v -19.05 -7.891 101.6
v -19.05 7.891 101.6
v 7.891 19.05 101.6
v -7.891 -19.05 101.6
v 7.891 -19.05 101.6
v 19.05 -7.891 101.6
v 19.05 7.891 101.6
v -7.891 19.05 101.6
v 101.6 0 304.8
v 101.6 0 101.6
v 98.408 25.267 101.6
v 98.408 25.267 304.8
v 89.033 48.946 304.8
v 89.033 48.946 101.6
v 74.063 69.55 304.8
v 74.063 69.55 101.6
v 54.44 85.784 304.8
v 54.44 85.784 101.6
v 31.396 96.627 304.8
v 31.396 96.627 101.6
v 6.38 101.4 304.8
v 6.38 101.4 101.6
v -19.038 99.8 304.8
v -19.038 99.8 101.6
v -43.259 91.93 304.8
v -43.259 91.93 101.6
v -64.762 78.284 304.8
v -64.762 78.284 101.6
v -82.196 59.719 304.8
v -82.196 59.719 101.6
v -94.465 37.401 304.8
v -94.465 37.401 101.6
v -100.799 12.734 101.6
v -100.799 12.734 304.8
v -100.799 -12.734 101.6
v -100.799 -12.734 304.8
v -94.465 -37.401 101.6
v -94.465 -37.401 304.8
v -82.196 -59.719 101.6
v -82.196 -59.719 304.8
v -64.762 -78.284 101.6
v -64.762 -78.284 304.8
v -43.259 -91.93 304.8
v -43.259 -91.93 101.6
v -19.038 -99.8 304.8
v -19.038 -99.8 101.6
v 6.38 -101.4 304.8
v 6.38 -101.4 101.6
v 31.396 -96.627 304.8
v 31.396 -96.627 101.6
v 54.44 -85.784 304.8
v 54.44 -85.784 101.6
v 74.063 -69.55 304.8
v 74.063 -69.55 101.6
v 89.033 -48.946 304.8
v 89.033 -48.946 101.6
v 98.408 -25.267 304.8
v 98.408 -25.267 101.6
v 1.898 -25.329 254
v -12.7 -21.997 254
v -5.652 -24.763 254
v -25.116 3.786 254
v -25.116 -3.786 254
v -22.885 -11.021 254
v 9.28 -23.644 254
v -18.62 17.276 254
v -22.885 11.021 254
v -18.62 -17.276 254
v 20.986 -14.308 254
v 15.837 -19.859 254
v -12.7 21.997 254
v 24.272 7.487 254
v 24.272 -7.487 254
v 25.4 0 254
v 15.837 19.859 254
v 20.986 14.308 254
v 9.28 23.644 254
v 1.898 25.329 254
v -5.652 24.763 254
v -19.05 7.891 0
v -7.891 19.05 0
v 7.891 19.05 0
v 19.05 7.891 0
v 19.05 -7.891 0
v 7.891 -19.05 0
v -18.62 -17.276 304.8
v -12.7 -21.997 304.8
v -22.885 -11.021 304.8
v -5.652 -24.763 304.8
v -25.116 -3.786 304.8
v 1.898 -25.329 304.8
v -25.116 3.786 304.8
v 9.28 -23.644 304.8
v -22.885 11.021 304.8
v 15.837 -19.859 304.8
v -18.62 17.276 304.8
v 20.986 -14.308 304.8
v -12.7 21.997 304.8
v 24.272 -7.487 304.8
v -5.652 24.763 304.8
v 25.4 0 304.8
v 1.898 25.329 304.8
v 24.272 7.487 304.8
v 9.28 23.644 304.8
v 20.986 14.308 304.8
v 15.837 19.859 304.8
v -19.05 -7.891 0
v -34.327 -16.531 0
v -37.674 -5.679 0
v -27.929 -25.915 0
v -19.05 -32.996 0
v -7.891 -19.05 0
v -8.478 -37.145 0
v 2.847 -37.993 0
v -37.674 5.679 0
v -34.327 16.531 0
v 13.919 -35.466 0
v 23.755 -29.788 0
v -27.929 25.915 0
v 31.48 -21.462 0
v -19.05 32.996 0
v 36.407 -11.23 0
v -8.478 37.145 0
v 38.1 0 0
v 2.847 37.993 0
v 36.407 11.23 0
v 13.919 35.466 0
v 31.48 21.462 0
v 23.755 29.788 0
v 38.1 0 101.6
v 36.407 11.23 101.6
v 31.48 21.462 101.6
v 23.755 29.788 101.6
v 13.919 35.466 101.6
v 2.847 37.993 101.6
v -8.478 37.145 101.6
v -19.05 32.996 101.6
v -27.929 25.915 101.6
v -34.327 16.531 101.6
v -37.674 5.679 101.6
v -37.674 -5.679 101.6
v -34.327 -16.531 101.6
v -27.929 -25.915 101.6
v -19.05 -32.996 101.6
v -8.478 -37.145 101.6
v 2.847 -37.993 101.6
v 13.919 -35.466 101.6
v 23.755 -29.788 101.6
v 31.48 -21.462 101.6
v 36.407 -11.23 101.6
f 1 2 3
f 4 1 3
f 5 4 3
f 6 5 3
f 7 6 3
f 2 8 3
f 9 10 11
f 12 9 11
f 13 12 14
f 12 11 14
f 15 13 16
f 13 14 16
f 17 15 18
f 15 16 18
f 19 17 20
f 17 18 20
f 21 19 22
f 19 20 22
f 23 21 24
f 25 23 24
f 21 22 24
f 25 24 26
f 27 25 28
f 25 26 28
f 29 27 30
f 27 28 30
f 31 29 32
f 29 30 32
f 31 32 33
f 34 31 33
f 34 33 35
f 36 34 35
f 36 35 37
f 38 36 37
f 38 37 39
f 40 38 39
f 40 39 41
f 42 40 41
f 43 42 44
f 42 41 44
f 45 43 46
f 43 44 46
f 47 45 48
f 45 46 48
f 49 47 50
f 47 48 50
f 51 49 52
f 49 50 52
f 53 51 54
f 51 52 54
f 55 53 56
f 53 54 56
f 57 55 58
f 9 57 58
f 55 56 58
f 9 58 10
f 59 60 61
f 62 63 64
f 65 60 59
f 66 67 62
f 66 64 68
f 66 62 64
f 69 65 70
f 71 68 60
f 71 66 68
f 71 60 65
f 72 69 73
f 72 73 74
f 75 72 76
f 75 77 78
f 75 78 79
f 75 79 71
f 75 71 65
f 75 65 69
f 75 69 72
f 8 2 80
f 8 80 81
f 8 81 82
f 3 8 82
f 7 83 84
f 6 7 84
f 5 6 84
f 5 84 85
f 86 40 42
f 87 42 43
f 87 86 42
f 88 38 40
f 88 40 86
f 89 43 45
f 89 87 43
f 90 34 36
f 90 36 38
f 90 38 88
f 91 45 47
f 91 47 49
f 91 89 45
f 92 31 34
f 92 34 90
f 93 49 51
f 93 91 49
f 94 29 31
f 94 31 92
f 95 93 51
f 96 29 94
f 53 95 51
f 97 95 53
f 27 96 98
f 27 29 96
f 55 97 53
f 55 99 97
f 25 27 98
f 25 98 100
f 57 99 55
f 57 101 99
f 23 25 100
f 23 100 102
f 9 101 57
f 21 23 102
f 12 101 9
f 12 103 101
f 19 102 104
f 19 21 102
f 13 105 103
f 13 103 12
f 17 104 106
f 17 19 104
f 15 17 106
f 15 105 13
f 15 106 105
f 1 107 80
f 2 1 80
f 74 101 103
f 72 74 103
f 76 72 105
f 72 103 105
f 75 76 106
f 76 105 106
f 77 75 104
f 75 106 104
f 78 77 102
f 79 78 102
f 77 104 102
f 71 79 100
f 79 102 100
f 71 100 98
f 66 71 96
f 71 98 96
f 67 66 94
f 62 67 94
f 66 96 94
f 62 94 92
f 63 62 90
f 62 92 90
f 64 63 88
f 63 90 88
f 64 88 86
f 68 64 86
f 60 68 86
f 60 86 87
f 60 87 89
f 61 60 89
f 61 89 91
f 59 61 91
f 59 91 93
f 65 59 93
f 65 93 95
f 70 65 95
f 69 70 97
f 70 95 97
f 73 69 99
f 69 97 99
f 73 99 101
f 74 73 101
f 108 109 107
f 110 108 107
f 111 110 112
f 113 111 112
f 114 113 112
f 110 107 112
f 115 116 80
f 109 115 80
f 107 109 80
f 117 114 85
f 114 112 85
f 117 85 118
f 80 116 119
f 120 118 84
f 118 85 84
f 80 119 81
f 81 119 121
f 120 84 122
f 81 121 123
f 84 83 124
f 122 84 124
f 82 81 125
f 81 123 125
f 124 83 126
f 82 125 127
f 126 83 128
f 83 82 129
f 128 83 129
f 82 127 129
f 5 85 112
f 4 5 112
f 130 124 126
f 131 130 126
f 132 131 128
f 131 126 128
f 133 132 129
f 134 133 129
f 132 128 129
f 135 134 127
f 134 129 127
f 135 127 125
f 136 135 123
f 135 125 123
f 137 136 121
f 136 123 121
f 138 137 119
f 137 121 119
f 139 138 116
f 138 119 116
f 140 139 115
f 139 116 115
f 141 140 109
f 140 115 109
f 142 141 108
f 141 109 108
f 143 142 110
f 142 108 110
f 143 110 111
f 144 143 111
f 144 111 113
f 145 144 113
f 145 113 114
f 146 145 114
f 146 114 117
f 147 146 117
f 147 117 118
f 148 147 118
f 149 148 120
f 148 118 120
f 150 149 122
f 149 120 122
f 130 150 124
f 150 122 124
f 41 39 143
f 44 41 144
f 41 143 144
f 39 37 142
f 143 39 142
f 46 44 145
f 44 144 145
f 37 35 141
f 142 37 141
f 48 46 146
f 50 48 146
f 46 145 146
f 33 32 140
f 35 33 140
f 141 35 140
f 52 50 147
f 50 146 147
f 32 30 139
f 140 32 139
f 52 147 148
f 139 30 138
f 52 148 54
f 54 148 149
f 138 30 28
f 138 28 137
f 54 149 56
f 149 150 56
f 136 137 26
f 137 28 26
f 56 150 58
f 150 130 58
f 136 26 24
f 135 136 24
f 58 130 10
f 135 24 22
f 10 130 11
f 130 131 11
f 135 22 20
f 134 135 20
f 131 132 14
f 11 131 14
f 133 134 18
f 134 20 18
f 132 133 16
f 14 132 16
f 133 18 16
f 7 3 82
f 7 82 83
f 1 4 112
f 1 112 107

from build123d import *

# Parameters (mm, degrees)
F0_R     = 38.1
F1_DEPTH = 101.6
F2_R     = 101.6
F2_R_2   = 38.1
F3_DEPTH = 203.2
F4_R     = 25.4
F5_DEPTH = 50.8


with BuildPart() as f1:
    # F0 (on Top) → F1 (new body)
    with BuildSketch(Plane.XY):
        Circle(F0_R)
        Polygon((-19.05, 7.890768), (-7.890768, 19.05), (7.890768, 19.05), (19.05, 7.890768), (19.05, -7.890768), (7.890768, -19.05), (-7.890768, -19.05), (-19.05, -7.890768), align=None, mode=Mode.SUBTRACT)
    extrude(amount=F1_DEPTH)

    # F2 (on face) → F3 (join)
    with BuildSketch(Plane.XY.offset(101.6)):
        Circle(F2_R)
        Circle(F2_R_2, mode=Mode.SUBTRACT)
        Circle(F2_R)
    extrude(amount=F3_DEPTH)

    # F4 (on face) → F5 (cut)
    with BuildSketch(Plane.XY.offset(304.8)):
        Circle(F4_R)
    extrude(amount=-F5_DEPTH, mode=Mode.SUBTRACT)


solid = f1.part
